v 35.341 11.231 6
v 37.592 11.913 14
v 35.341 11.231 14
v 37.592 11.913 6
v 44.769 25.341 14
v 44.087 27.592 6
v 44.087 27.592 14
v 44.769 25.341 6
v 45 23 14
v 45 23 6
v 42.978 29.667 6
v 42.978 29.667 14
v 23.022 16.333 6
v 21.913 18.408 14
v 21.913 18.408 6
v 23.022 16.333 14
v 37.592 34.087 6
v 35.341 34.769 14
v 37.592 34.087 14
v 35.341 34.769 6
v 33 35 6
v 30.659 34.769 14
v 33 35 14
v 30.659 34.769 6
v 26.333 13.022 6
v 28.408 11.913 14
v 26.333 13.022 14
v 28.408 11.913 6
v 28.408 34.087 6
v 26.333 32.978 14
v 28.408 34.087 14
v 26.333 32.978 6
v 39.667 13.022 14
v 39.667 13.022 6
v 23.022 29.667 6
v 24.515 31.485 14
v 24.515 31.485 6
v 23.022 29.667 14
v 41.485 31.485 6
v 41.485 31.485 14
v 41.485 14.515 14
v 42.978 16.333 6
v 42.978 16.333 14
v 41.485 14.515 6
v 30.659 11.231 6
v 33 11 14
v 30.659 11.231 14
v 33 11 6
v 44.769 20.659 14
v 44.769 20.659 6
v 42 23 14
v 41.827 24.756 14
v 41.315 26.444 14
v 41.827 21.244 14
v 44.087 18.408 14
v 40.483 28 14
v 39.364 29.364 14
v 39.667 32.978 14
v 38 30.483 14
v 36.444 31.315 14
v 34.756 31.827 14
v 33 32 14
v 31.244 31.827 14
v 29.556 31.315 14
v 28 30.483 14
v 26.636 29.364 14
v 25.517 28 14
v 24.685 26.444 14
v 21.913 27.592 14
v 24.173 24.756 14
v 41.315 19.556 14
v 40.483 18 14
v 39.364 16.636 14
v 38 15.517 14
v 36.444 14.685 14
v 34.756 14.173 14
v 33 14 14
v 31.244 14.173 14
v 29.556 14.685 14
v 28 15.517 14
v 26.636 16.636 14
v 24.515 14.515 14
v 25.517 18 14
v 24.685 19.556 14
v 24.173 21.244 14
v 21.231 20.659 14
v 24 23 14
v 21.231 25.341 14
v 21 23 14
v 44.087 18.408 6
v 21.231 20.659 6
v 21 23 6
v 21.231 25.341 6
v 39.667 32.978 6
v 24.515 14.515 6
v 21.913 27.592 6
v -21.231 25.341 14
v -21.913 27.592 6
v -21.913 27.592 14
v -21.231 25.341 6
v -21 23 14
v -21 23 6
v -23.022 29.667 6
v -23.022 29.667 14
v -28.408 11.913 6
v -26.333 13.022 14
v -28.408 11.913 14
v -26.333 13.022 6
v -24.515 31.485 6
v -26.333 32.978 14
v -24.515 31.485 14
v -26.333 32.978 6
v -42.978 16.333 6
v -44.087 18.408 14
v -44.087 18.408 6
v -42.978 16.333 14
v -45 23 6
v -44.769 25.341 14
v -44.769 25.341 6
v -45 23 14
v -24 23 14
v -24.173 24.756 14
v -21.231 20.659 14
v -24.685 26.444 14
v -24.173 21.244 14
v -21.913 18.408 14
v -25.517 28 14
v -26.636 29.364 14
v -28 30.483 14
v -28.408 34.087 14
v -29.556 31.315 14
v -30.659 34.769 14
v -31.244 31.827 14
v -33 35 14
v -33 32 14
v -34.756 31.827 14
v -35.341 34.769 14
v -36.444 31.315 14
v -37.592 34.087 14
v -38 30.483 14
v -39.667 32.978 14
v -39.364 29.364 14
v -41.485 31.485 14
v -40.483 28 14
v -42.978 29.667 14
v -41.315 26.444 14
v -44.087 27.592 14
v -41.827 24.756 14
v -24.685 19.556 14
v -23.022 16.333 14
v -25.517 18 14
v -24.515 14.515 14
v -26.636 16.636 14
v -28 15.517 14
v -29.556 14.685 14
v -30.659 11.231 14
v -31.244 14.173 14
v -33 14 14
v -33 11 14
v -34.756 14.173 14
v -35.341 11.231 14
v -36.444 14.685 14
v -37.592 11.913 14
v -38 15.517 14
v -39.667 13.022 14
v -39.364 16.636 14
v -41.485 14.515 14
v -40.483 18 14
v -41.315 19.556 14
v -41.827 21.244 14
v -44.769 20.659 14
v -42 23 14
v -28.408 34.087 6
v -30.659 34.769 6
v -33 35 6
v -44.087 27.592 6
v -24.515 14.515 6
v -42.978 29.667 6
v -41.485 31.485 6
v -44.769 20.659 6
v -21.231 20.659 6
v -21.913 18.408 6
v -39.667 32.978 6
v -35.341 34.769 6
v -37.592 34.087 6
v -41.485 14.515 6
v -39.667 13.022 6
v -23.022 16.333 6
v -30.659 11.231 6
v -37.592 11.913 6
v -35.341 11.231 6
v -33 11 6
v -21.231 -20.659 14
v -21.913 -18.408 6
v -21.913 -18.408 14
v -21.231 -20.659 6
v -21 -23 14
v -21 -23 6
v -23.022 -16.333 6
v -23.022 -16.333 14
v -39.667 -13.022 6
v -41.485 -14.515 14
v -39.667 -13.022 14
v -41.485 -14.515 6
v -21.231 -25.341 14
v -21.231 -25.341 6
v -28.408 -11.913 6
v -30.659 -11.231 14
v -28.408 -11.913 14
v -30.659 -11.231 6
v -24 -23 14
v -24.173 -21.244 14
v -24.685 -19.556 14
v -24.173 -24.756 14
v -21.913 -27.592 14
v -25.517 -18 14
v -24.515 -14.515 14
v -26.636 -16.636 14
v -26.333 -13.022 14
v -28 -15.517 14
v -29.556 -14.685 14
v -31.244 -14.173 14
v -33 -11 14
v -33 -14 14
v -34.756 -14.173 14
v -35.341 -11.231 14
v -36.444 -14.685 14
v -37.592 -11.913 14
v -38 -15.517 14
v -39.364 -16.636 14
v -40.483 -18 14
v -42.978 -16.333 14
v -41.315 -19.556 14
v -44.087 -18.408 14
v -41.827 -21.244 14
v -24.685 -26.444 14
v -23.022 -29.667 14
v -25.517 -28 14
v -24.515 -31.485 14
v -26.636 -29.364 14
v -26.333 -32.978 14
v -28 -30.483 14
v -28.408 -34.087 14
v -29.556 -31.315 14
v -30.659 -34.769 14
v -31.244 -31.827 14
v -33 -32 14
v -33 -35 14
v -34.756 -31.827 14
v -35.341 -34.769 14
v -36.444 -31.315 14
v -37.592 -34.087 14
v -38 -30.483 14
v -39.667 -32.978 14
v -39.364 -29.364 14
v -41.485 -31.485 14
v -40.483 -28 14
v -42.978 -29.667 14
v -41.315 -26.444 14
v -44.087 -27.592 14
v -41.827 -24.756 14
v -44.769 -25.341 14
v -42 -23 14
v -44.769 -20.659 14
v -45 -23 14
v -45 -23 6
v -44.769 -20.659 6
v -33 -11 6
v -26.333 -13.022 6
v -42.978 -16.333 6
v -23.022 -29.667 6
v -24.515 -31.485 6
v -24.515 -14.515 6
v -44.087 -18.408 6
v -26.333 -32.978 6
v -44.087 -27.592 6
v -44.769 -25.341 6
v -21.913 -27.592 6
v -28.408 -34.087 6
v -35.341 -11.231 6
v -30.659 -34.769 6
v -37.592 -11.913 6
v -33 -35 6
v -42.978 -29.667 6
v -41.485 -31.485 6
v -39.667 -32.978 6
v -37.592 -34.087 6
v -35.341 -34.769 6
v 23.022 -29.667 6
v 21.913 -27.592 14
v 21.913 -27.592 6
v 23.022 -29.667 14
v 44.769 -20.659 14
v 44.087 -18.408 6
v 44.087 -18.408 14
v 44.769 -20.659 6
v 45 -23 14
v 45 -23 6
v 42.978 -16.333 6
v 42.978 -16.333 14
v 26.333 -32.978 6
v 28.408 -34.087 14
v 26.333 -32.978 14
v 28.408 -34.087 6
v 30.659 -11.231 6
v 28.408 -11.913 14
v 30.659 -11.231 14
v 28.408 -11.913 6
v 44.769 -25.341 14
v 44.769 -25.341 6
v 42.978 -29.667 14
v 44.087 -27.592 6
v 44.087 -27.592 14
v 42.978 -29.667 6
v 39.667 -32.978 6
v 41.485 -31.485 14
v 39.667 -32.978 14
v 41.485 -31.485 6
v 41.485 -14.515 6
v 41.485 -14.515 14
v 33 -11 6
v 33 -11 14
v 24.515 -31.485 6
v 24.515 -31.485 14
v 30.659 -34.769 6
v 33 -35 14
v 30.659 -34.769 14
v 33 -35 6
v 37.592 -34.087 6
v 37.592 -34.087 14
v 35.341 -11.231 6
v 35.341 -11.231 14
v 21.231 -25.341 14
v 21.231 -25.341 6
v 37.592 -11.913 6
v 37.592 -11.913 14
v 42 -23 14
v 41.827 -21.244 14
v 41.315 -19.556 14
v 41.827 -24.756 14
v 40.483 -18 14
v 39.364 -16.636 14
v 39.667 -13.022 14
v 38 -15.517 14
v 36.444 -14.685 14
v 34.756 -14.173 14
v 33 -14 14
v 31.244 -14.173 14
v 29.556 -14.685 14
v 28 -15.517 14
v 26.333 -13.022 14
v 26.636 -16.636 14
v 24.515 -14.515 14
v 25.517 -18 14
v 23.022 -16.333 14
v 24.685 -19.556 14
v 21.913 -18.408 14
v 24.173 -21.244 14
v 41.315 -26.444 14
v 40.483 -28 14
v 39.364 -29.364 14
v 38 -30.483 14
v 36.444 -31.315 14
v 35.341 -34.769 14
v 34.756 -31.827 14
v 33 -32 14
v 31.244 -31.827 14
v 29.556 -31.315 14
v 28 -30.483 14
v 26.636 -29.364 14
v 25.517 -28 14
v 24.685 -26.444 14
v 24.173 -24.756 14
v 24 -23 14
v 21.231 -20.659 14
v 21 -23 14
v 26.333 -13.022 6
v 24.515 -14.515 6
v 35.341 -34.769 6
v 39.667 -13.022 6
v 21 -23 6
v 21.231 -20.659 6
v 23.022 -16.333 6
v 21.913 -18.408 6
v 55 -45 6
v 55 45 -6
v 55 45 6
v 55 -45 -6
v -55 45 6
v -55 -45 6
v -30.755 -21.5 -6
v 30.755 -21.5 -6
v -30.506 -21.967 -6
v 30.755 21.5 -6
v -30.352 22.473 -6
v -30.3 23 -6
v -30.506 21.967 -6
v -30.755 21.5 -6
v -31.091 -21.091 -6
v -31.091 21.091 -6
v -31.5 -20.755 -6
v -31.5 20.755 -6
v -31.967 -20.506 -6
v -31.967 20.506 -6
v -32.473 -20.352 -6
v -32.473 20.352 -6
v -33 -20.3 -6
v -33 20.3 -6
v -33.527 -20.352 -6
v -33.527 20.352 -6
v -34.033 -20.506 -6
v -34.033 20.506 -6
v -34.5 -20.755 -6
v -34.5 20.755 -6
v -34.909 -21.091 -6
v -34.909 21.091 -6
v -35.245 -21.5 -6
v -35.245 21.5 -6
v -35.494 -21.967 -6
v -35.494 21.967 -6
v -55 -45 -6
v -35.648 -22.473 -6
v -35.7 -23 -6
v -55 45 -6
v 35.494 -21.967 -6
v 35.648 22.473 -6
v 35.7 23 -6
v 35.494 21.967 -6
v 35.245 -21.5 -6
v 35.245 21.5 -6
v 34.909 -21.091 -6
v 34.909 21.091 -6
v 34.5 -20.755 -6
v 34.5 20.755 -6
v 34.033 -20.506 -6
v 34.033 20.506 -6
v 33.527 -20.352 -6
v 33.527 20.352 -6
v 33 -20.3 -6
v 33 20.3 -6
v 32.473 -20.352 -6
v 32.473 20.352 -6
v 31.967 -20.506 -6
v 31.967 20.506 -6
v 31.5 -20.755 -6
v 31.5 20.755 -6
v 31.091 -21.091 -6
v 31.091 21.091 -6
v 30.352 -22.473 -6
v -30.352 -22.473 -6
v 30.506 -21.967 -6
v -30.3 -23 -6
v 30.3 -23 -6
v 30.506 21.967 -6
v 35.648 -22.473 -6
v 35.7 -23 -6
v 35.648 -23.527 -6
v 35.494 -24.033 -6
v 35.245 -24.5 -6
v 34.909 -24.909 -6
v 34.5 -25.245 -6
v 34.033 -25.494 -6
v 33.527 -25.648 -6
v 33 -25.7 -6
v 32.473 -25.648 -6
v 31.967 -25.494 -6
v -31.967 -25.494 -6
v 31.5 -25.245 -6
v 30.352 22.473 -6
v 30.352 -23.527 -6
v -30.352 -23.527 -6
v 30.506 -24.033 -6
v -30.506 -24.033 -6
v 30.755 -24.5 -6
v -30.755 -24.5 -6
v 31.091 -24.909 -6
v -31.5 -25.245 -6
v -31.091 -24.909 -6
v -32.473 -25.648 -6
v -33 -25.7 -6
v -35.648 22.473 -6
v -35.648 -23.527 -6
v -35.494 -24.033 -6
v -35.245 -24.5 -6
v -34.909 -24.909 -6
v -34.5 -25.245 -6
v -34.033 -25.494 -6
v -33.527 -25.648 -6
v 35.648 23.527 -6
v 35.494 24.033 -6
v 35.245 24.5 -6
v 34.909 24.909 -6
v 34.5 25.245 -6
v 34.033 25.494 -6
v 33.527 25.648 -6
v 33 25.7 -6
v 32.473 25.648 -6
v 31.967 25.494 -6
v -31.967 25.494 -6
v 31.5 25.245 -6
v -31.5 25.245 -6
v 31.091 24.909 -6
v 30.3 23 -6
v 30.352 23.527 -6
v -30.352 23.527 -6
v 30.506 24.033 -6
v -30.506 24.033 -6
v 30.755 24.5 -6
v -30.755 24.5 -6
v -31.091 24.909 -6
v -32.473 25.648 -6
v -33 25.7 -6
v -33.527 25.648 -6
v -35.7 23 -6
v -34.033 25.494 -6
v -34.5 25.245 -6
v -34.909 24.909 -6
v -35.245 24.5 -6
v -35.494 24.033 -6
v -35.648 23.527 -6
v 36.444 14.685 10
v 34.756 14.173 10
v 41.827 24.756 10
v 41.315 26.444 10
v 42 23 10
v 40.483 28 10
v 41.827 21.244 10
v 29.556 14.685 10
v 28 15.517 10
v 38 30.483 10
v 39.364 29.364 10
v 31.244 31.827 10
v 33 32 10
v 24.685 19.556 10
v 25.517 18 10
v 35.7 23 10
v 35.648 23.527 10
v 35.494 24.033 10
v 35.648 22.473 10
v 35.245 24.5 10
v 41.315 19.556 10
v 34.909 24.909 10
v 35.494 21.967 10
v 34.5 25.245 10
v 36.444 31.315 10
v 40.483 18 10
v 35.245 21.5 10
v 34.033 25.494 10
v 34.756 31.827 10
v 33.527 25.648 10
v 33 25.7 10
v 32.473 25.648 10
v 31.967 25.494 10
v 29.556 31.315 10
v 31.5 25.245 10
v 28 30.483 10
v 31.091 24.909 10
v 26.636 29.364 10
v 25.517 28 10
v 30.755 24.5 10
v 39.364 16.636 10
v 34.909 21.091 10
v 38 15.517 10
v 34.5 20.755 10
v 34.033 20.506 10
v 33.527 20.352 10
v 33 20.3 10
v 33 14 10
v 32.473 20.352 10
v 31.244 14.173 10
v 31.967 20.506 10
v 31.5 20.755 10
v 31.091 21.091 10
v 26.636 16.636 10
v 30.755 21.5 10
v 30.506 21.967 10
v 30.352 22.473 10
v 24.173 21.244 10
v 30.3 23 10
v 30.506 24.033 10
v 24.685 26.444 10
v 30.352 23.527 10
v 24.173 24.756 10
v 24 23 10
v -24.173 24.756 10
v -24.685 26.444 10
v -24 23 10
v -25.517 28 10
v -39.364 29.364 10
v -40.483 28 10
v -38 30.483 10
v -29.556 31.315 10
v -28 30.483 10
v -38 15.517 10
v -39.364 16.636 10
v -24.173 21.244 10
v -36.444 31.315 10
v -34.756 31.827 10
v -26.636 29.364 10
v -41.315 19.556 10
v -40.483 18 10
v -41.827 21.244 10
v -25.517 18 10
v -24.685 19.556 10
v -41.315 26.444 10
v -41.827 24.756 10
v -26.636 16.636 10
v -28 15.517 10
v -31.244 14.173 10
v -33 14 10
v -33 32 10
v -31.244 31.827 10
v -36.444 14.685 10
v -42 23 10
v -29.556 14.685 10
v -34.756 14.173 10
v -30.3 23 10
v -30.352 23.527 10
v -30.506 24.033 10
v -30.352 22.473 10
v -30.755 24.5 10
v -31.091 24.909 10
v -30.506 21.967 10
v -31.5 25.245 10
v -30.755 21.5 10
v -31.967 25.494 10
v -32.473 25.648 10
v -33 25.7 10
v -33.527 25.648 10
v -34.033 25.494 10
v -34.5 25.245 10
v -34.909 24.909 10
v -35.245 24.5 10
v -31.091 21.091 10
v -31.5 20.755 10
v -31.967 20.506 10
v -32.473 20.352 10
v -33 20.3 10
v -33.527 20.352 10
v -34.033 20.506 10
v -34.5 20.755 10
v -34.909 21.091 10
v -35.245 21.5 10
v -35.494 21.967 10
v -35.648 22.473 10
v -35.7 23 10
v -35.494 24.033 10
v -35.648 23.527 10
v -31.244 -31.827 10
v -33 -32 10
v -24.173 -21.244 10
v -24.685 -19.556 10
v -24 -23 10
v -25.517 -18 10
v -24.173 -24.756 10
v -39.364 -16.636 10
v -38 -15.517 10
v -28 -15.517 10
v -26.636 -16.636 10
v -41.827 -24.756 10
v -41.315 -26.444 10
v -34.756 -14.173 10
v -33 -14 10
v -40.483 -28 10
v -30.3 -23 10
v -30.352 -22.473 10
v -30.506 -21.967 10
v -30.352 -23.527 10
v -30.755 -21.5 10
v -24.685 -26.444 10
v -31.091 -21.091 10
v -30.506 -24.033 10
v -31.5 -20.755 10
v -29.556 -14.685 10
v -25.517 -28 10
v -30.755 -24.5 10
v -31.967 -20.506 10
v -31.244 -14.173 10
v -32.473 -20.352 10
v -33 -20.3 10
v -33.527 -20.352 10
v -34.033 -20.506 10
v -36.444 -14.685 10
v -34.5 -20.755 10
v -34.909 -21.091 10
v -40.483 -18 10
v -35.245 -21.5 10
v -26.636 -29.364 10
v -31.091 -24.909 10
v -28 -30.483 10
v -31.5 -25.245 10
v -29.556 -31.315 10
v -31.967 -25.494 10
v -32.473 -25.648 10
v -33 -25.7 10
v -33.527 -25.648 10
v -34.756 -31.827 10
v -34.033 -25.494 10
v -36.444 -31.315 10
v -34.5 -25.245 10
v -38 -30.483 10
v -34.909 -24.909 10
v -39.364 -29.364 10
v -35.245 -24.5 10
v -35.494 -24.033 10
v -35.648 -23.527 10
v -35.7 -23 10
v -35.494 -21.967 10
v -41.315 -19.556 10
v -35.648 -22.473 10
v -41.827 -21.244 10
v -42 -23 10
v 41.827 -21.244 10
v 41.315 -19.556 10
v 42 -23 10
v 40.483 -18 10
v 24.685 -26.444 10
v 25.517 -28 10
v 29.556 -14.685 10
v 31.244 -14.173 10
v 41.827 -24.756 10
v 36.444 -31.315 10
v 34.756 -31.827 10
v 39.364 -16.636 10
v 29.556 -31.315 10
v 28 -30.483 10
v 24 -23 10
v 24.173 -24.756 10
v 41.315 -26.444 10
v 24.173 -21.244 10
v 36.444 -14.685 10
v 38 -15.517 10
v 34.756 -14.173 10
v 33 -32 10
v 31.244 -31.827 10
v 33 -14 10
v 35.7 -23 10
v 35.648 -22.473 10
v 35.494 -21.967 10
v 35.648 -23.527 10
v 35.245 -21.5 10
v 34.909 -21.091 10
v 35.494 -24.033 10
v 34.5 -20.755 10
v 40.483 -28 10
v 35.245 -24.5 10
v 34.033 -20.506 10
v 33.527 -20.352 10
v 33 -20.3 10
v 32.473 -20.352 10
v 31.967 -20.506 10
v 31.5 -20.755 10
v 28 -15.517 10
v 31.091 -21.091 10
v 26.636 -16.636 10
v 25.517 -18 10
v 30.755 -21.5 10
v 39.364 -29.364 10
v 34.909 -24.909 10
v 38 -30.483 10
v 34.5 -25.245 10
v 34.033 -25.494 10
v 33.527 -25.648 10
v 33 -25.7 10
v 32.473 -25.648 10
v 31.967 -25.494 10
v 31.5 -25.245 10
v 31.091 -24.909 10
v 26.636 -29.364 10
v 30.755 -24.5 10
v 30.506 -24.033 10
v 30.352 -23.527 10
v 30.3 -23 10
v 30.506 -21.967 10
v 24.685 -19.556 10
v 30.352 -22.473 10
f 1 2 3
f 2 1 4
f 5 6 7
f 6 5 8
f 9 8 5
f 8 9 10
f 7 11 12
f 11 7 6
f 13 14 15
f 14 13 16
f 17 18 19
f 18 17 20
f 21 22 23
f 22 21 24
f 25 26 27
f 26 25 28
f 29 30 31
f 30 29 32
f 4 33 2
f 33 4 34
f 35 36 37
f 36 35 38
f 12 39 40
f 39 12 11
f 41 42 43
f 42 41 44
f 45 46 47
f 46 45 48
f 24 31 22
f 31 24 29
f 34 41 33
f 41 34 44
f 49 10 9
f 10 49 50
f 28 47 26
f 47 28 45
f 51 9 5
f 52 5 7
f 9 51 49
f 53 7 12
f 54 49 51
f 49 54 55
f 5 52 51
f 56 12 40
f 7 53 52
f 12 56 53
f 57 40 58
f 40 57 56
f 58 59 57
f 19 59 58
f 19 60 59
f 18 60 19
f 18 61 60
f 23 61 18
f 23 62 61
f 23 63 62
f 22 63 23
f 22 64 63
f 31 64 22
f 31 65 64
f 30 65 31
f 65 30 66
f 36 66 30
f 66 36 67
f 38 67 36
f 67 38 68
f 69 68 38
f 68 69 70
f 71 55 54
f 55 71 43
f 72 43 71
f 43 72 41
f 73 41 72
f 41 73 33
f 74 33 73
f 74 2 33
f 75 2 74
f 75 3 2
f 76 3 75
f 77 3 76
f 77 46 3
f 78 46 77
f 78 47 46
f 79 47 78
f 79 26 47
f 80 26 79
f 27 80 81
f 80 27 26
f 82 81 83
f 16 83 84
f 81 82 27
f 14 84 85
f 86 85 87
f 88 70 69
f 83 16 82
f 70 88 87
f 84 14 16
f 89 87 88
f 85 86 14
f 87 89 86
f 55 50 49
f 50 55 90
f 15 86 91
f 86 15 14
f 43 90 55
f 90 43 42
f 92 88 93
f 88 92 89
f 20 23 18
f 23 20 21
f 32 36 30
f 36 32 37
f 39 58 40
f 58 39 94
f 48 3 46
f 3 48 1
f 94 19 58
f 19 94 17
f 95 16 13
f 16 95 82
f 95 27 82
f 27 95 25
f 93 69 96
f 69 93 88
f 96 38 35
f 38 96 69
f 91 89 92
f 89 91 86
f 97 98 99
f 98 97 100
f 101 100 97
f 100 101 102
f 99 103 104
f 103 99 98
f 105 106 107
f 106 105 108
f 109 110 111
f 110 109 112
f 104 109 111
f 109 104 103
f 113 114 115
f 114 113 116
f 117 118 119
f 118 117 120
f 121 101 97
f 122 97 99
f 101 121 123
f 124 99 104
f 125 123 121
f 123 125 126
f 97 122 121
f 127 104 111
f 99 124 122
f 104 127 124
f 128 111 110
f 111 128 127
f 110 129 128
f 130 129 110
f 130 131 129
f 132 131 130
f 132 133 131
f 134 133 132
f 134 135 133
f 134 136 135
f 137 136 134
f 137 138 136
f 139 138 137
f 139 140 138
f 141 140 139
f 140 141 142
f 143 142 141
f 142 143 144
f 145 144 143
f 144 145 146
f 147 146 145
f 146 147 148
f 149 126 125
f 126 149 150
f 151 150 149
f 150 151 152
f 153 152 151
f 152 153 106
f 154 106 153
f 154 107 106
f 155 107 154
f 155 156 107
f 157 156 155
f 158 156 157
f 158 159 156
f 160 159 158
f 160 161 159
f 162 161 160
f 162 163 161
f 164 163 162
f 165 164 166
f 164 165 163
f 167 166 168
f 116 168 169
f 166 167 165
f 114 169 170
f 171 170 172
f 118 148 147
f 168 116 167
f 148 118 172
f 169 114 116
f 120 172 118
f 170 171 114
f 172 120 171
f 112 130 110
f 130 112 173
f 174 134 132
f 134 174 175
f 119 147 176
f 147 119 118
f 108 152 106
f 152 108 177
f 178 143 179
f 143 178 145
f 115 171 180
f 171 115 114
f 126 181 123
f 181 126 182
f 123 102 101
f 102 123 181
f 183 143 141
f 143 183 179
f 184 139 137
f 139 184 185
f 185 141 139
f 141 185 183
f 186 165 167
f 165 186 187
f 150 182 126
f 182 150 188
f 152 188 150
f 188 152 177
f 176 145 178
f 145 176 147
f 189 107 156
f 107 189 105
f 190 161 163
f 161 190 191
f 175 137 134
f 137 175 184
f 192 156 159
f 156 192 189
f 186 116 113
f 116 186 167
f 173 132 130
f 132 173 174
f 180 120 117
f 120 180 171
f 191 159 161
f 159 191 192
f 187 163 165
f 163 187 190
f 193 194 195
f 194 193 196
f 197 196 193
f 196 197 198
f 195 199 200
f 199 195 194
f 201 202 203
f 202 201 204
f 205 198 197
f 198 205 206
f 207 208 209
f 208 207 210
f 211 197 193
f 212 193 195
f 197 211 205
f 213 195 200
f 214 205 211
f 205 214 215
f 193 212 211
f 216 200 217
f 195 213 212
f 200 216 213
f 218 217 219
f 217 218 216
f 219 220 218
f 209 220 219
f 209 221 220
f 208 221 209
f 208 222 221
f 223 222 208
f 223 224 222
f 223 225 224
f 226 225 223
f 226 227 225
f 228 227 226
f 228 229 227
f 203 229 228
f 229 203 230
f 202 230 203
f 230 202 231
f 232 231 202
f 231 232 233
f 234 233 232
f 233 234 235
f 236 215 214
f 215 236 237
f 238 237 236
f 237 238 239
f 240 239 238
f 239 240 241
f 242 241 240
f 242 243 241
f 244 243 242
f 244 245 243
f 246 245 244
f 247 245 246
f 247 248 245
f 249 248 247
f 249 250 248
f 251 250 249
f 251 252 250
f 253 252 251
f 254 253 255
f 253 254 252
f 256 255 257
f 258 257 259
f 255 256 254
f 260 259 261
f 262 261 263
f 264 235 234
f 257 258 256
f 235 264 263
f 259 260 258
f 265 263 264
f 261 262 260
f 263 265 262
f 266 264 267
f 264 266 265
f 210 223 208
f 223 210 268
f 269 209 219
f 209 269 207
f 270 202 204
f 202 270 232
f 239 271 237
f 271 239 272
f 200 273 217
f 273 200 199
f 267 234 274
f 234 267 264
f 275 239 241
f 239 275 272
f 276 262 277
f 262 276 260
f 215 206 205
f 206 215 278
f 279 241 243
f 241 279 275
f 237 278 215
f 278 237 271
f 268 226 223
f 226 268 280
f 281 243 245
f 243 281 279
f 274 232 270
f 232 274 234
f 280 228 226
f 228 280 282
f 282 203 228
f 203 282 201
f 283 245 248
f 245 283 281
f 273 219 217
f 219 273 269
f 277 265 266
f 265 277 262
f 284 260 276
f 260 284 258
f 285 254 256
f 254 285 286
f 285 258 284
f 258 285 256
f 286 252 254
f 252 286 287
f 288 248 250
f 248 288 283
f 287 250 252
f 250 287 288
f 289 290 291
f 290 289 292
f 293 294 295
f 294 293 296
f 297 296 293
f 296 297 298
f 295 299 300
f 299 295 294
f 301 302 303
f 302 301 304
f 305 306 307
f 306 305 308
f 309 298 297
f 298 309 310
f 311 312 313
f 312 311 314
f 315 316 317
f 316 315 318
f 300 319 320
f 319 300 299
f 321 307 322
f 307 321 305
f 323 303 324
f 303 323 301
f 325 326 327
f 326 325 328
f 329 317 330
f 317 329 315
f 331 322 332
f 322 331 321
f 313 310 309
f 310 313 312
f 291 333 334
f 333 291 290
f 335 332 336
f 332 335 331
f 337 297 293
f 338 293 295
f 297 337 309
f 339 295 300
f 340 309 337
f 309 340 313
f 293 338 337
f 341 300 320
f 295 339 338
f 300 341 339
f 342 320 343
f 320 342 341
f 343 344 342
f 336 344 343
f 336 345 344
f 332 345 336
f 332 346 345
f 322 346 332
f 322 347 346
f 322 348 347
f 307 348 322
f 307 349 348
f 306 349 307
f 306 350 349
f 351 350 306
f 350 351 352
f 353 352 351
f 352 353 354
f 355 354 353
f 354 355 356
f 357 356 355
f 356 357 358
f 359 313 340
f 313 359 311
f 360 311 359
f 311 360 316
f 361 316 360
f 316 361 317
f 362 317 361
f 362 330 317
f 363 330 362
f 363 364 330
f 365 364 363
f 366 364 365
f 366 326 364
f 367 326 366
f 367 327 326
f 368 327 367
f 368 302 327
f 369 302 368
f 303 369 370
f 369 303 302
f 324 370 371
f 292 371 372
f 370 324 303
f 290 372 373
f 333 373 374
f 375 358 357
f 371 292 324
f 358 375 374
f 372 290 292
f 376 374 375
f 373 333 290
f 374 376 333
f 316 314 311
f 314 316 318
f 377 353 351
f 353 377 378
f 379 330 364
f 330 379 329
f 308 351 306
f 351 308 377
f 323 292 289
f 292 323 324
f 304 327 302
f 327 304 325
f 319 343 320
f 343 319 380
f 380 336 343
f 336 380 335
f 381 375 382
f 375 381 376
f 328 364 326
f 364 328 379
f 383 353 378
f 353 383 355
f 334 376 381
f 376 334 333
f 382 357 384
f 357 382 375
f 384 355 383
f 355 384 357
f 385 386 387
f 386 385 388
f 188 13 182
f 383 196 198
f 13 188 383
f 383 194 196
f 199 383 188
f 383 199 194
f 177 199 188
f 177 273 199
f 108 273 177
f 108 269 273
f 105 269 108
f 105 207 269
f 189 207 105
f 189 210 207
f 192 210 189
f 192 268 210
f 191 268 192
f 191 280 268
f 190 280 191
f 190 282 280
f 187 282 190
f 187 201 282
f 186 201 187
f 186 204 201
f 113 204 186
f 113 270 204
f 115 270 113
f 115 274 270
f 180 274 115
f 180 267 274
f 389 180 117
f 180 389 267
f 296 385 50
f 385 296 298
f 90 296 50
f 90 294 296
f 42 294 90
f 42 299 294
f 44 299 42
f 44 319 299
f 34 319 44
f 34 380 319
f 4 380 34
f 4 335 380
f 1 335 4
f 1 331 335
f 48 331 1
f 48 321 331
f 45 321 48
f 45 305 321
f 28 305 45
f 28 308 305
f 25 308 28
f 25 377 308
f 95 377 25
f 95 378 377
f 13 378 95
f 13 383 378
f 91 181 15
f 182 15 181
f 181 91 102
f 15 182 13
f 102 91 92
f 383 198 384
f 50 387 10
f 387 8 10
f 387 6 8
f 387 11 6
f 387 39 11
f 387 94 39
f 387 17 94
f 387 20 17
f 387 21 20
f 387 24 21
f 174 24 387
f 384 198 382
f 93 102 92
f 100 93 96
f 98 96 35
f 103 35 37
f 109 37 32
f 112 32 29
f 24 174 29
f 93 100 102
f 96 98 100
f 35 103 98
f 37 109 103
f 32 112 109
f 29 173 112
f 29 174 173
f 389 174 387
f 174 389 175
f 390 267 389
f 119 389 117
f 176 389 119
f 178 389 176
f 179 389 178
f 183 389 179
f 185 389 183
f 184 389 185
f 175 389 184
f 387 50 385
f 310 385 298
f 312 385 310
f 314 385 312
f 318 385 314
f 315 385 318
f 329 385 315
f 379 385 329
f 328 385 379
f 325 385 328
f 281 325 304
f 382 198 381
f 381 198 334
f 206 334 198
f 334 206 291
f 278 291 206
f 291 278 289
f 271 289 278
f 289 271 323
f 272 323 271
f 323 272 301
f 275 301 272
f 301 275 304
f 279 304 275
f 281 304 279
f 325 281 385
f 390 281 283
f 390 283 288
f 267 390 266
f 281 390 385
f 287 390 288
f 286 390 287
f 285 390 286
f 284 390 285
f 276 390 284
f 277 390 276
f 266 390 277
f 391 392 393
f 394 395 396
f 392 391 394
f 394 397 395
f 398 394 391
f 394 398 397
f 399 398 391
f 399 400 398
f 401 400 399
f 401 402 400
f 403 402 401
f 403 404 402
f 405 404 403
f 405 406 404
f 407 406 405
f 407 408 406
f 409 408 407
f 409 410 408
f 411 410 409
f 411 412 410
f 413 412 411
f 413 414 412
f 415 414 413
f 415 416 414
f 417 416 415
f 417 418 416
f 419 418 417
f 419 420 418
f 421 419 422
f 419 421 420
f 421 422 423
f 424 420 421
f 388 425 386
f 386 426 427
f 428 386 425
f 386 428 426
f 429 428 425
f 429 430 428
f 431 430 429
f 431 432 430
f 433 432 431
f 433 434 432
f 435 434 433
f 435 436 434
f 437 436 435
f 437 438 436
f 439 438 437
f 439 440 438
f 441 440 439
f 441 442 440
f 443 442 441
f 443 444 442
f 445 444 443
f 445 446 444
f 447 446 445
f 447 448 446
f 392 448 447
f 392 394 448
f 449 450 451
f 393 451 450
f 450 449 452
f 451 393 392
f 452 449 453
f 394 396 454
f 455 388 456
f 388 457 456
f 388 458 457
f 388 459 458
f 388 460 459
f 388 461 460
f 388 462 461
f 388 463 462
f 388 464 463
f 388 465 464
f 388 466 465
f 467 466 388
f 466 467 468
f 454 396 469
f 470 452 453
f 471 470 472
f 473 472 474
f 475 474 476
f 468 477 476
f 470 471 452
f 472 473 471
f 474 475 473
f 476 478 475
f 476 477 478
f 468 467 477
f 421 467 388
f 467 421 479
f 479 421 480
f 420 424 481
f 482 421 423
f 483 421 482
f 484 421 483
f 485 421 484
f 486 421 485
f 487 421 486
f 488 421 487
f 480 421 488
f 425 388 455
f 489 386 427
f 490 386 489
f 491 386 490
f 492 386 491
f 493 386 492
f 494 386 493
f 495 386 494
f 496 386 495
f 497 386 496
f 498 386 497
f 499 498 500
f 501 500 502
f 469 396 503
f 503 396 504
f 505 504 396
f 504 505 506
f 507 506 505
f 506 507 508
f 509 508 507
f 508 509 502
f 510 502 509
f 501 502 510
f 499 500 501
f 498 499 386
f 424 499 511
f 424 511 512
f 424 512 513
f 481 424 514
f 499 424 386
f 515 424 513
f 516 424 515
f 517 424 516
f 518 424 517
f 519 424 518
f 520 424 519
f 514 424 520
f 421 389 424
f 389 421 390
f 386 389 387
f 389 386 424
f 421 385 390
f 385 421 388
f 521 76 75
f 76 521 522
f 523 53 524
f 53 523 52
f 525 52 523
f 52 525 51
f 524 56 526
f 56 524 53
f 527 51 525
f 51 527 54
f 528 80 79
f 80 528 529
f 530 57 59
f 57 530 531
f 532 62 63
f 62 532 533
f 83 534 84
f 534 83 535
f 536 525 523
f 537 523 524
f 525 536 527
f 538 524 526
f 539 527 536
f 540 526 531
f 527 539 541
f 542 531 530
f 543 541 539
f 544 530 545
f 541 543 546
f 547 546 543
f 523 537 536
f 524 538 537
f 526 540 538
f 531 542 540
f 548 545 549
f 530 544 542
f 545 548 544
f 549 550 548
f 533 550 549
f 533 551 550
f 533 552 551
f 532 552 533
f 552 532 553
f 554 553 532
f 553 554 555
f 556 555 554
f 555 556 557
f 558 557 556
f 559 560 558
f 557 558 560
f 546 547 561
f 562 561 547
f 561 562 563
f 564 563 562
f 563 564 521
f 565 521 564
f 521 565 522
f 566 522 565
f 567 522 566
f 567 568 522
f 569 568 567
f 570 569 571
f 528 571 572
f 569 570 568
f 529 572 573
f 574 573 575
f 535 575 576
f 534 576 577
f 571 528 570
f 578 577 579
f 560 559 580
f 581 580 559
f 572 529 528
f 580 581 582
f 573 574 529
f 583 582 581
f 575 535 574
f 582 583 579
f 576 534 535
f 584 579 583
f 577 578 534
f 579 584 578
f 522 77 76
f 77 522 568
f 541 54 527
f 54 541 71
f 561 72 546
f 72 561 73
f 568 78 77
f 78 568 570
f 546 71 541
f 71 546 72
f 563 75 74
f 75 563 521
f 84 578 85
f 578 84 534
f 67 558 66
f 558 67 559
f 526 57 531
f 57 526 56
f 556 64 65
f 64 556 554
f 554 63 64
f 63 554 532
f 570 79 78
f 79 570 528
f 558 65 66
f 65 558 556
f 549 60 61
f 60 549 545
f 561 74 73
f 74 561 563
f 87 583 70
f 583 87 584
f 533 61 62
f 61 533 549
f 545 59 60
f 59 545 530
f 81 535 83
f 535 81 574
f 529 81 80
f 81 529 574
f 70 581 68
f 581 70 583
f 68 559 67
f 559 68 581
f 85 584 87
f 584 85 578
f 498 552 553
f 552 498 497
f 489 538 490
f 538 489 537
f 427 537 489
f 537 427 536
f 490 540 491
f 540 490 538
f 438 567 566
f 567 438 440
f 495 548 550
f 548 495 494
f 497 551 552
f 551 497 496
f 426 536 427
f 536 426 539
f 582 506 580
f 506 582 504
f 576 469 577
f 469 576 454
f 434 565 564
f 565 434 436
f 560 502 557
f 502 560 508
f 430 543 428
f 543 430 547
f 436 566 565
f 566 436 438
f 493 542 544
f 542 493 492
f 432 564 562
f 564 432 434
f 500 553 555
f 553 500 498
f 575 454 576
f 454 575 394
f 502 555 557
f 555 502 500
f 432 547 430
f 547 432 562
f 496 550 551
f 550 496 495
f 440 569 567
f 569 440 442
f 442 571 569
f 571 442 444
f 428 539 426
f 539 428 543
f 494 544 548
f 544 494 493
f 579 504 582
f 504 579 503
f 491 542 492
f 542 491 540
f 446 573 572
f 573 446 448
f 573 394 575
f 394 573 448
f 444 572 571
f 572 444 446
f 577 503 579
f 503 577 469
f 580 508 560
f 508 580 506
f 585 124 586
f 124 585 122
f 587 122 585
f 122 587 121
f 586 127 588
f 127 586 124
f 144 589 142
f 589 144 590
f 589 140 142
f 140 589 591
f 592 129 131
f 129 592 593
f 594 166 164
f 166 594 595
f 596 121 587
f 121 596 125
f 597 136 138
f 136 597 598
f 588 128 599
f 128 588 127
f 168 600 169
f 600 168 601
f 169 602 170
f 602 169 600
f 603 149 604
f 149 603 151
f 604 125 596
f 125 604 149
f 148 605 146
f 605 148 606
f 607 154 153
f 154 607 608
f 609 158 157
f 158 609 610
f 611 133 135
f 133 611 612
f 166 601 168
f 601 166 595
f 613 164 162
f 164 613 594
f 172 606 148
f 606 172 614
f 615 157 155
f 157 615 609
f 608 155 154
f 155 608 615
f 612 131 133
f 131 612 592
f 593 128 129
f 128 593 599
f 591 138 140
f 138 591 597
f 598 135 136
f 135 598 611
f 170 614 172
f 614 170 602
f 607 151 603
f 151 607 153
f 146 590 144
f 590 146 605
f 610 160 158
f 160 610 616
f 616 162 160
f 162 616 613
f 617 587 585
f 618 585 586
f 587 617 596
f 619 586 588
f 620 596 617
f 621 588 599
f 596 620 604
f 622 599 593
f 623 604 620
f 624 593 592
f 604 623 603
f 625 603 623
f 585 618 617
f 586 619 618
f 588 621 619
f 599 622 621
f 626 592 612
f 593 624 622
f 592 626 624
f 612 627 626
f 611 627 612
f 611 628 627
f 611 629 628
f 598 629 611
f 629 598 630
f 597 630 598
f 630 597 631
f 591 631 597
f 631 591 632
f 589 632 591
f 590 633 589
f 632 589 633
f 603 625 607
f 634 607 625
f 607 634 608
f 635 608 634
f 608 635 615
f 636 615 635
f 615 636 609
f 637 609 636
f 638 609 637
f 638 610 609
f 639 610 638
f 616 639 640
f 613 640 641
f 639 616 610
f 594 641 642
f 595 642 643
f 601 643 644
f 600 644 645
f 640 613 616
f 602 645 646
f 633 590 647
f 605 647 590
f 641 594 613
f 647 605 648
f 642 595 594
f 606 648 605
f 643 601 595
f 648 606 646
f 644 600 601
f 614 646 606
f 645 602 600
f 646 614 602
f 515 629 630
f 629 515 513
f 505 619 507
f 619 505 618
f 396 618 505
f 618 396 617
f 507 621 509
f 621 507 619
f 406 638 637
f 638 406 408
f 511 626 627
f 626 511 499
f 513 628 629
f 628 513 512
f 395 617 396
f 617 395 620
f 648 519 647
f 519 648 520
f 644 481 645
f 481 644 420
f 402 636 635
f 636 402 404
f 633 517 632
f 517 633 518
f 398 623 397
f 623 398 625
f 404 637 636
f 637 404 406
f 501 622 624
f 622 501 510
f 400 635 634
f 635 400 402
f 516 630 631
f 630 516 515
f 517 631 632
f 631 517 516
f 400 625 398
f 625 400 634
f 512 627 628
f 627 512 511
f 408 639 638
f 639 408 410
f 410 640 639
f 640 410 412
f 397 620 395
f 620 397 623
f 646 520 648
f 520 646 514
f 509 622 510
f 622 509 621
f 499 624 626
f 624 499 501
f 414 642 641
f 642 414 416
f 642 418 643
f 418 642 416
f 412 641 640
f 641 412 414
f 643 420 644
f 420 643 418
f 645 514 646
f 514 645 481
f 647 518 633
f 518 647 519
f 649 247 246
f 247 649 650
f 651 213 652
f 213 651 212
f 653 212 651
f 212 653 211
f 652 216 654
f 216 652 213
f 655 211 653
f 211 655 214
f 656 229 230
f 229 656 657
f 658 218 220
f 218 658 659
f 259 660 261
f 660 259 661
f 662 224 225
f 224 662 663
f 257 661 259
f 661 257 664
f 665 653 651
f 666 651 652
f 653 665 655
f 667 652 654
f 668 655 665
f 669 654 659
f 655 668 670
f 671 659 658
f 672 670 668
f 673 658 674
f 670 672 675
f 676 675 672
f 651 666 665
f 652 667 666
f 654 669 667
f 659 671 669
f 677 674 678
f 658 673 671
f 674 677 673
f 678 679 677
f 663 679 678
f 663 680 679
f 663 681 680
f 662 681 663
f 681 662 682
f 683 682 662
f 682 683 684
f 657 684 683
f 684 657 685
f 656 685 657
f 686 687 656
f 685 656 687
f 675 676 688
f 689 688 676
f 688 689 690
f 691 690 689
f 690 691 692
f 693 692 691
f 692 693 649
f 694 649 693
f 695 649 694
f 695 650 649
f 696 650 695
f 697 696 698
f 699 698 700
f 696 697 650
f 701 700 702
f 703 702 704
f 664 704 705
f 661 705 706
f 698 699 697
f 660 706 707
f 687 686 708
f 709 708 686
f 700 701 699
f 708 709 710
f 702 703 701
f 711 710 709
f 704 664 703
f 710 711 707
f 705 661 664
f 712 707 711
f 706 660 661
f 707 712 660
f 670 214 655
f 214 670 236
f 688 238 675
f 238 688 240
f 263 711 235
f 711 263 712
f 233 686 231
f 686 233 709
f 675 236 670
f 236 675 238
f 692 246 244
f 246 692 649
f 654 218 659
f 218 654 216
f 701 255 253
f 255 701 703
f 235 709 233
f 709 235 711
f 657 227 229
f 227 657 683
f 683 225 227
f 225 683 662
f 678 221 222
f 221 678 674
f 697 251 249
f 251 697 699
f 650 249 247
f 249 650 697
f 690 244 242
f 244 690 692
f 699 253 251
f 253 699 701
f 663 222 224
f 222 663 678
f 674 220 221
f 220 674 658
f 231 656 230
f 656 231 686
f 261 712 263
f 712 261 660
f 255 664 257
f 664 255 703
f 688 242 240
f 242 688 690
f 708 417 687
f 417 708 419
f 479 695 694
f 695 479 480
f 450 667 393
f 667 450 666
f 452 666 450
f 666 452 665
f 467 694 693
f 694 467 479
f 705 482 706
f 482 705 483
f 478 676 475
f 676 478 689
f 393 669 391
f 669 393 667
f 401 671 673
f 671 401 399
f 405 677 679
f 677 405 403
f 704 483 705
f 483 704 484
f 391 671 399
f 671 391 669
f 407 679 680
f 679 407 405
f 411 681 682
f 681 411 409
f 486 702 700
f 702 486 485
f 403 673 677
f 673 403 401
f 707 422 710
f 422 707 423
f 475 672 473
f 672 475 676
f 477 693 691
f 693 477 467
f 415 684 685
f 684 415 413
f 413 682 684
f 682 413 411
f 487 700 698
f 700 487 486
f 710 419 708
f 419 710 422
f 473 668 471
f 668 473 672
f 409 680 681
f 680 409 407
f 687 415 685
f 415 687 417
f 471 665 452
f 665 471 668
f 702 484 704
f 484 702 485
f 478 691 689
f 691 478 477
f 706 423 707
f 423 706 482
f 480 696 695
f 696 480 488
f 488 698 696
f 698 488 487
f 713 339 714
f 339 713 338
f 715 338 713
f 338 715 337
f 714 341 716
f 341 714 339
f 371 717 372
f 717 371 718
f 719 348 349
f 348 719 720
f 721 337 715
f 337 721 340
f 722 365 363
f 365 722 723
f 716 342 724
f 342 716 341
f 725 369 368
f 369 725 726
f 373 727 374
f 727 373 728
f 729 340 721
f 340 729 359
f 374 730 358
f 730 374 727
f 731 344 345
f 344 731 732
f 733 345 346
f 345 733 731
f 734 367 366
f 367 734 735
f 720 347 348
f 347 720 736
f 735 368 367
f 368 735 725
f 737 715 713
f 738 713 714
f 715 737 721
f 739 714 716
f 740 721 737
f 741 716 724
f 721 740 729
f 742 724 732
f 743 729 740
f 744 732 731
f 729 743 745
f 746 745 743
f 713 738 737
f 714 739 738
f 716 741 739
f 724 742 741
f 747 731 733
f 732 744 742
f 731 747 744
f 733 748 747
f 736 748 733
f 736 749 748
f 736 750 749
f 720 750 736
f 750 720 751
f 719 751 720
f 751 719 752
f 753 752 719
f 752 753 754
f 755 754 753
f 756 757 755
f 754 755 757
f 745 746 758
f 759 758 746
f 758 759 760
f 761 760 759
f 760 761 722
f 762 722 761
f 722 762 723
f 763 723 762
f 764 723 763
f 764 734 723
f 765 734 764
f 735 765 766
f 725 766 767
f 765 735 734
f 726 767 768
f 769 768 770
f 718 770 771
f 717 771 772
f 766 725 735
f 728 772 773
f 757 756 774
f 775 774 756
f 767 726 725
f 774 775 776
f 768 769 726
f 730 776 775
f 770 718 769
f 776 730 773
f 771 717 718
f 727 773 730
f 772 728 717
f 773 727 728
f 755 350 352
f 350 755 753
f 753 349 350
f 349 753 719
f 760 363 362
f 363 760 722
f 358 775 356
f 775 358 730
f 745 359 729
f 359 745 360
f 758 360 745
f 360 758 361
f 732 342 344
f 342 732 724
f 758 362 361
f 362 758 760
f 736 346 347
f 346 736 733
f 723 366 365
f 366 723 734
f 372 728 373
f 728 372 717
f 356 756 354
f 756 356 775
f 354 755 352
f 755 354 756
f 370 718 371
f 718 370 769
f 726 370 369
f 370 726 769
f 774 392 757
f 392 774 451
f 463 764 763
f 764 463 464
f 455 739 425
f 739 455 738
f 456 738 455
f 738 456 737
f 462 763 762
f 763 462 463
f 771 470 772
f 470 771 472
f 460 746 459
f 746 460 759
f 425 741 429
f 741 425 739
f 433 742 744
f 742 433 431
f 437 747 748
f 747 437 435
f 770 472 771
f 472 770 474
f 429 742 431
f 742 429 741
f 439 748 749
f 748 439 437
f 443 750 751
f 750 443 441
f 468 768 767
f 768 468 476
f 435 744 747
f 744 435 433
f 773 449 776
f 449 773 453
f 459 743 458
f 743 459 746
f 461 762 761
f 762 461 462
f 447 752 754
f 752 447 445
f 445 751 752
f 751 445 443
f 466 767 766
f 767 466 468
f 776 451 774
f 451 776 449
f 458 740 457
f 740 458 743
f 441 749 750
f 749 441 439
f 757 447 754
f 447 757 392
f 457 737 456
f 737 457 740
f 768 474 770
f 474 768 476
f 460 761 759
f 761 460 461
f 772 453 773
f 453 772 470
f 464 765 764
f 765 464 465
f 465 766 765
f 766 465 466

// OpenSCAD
$fn = 32;

// ----------------------------------------------------------------------
// Socket pad plate
// bosses with counterbored sockets for the screws
// ----------------------------------------------------------------------

// --- parameters (mm) ---
base_t = 12;            // base plate thickness
boss_h = 8;             // boss height above the base plate
boss_d = 24;            // boss diameter
socket_d = 18;          // socket diameter
socket_depth = 4;       // socket depth from the boss face
bolt_d = 5.4;           // screw clearance hole through the socket floor
plate = [110, 90, 12];  // overall size (x, y, z)
edge = 22;              // boss centre offset from the plate edge
pads = 4;               // boss count, one per corner

// --- derived feature positions (mm) ---
height = base_t + boss_h;        // = 20   overall height of the part
corner_x = plate[0] / 2 - edge;  // = 33   boss centre X
corner_y = plate[1] / 2 - edge;  // = 23   boss centre Y
feature_centers = [
  [corner_x, corner_y],
  [-corner_x, corner_y],
  [-corner_x, -corner_y],
  [corner_x, -corner_y]
];   // boss centres: sockets, holes and the pads themselves are placed from here

// base plate, bosses on feature_centers, socket + through hole in each
difference() {
  union() {
    cube(plate, center = true);
    for (centre = feature_centers)
      translate([centre[0], centre[1], plate[2] / 2 - 1])
        cylinder(d = boss_d, h = boss_h + 1);
  }
  for (centre = feature_centers) {
    translate([centre[0], centre[1], plate[2] / 2 + boss_h - socket_depth])
      cylinder(d = socket_d, h = socket_depth + 1);
    translate([centre[0], centre[1], -height])
      cylinder(d = bolt_d, h = 2 * height + 2);  // through the socket floor
  }
}
